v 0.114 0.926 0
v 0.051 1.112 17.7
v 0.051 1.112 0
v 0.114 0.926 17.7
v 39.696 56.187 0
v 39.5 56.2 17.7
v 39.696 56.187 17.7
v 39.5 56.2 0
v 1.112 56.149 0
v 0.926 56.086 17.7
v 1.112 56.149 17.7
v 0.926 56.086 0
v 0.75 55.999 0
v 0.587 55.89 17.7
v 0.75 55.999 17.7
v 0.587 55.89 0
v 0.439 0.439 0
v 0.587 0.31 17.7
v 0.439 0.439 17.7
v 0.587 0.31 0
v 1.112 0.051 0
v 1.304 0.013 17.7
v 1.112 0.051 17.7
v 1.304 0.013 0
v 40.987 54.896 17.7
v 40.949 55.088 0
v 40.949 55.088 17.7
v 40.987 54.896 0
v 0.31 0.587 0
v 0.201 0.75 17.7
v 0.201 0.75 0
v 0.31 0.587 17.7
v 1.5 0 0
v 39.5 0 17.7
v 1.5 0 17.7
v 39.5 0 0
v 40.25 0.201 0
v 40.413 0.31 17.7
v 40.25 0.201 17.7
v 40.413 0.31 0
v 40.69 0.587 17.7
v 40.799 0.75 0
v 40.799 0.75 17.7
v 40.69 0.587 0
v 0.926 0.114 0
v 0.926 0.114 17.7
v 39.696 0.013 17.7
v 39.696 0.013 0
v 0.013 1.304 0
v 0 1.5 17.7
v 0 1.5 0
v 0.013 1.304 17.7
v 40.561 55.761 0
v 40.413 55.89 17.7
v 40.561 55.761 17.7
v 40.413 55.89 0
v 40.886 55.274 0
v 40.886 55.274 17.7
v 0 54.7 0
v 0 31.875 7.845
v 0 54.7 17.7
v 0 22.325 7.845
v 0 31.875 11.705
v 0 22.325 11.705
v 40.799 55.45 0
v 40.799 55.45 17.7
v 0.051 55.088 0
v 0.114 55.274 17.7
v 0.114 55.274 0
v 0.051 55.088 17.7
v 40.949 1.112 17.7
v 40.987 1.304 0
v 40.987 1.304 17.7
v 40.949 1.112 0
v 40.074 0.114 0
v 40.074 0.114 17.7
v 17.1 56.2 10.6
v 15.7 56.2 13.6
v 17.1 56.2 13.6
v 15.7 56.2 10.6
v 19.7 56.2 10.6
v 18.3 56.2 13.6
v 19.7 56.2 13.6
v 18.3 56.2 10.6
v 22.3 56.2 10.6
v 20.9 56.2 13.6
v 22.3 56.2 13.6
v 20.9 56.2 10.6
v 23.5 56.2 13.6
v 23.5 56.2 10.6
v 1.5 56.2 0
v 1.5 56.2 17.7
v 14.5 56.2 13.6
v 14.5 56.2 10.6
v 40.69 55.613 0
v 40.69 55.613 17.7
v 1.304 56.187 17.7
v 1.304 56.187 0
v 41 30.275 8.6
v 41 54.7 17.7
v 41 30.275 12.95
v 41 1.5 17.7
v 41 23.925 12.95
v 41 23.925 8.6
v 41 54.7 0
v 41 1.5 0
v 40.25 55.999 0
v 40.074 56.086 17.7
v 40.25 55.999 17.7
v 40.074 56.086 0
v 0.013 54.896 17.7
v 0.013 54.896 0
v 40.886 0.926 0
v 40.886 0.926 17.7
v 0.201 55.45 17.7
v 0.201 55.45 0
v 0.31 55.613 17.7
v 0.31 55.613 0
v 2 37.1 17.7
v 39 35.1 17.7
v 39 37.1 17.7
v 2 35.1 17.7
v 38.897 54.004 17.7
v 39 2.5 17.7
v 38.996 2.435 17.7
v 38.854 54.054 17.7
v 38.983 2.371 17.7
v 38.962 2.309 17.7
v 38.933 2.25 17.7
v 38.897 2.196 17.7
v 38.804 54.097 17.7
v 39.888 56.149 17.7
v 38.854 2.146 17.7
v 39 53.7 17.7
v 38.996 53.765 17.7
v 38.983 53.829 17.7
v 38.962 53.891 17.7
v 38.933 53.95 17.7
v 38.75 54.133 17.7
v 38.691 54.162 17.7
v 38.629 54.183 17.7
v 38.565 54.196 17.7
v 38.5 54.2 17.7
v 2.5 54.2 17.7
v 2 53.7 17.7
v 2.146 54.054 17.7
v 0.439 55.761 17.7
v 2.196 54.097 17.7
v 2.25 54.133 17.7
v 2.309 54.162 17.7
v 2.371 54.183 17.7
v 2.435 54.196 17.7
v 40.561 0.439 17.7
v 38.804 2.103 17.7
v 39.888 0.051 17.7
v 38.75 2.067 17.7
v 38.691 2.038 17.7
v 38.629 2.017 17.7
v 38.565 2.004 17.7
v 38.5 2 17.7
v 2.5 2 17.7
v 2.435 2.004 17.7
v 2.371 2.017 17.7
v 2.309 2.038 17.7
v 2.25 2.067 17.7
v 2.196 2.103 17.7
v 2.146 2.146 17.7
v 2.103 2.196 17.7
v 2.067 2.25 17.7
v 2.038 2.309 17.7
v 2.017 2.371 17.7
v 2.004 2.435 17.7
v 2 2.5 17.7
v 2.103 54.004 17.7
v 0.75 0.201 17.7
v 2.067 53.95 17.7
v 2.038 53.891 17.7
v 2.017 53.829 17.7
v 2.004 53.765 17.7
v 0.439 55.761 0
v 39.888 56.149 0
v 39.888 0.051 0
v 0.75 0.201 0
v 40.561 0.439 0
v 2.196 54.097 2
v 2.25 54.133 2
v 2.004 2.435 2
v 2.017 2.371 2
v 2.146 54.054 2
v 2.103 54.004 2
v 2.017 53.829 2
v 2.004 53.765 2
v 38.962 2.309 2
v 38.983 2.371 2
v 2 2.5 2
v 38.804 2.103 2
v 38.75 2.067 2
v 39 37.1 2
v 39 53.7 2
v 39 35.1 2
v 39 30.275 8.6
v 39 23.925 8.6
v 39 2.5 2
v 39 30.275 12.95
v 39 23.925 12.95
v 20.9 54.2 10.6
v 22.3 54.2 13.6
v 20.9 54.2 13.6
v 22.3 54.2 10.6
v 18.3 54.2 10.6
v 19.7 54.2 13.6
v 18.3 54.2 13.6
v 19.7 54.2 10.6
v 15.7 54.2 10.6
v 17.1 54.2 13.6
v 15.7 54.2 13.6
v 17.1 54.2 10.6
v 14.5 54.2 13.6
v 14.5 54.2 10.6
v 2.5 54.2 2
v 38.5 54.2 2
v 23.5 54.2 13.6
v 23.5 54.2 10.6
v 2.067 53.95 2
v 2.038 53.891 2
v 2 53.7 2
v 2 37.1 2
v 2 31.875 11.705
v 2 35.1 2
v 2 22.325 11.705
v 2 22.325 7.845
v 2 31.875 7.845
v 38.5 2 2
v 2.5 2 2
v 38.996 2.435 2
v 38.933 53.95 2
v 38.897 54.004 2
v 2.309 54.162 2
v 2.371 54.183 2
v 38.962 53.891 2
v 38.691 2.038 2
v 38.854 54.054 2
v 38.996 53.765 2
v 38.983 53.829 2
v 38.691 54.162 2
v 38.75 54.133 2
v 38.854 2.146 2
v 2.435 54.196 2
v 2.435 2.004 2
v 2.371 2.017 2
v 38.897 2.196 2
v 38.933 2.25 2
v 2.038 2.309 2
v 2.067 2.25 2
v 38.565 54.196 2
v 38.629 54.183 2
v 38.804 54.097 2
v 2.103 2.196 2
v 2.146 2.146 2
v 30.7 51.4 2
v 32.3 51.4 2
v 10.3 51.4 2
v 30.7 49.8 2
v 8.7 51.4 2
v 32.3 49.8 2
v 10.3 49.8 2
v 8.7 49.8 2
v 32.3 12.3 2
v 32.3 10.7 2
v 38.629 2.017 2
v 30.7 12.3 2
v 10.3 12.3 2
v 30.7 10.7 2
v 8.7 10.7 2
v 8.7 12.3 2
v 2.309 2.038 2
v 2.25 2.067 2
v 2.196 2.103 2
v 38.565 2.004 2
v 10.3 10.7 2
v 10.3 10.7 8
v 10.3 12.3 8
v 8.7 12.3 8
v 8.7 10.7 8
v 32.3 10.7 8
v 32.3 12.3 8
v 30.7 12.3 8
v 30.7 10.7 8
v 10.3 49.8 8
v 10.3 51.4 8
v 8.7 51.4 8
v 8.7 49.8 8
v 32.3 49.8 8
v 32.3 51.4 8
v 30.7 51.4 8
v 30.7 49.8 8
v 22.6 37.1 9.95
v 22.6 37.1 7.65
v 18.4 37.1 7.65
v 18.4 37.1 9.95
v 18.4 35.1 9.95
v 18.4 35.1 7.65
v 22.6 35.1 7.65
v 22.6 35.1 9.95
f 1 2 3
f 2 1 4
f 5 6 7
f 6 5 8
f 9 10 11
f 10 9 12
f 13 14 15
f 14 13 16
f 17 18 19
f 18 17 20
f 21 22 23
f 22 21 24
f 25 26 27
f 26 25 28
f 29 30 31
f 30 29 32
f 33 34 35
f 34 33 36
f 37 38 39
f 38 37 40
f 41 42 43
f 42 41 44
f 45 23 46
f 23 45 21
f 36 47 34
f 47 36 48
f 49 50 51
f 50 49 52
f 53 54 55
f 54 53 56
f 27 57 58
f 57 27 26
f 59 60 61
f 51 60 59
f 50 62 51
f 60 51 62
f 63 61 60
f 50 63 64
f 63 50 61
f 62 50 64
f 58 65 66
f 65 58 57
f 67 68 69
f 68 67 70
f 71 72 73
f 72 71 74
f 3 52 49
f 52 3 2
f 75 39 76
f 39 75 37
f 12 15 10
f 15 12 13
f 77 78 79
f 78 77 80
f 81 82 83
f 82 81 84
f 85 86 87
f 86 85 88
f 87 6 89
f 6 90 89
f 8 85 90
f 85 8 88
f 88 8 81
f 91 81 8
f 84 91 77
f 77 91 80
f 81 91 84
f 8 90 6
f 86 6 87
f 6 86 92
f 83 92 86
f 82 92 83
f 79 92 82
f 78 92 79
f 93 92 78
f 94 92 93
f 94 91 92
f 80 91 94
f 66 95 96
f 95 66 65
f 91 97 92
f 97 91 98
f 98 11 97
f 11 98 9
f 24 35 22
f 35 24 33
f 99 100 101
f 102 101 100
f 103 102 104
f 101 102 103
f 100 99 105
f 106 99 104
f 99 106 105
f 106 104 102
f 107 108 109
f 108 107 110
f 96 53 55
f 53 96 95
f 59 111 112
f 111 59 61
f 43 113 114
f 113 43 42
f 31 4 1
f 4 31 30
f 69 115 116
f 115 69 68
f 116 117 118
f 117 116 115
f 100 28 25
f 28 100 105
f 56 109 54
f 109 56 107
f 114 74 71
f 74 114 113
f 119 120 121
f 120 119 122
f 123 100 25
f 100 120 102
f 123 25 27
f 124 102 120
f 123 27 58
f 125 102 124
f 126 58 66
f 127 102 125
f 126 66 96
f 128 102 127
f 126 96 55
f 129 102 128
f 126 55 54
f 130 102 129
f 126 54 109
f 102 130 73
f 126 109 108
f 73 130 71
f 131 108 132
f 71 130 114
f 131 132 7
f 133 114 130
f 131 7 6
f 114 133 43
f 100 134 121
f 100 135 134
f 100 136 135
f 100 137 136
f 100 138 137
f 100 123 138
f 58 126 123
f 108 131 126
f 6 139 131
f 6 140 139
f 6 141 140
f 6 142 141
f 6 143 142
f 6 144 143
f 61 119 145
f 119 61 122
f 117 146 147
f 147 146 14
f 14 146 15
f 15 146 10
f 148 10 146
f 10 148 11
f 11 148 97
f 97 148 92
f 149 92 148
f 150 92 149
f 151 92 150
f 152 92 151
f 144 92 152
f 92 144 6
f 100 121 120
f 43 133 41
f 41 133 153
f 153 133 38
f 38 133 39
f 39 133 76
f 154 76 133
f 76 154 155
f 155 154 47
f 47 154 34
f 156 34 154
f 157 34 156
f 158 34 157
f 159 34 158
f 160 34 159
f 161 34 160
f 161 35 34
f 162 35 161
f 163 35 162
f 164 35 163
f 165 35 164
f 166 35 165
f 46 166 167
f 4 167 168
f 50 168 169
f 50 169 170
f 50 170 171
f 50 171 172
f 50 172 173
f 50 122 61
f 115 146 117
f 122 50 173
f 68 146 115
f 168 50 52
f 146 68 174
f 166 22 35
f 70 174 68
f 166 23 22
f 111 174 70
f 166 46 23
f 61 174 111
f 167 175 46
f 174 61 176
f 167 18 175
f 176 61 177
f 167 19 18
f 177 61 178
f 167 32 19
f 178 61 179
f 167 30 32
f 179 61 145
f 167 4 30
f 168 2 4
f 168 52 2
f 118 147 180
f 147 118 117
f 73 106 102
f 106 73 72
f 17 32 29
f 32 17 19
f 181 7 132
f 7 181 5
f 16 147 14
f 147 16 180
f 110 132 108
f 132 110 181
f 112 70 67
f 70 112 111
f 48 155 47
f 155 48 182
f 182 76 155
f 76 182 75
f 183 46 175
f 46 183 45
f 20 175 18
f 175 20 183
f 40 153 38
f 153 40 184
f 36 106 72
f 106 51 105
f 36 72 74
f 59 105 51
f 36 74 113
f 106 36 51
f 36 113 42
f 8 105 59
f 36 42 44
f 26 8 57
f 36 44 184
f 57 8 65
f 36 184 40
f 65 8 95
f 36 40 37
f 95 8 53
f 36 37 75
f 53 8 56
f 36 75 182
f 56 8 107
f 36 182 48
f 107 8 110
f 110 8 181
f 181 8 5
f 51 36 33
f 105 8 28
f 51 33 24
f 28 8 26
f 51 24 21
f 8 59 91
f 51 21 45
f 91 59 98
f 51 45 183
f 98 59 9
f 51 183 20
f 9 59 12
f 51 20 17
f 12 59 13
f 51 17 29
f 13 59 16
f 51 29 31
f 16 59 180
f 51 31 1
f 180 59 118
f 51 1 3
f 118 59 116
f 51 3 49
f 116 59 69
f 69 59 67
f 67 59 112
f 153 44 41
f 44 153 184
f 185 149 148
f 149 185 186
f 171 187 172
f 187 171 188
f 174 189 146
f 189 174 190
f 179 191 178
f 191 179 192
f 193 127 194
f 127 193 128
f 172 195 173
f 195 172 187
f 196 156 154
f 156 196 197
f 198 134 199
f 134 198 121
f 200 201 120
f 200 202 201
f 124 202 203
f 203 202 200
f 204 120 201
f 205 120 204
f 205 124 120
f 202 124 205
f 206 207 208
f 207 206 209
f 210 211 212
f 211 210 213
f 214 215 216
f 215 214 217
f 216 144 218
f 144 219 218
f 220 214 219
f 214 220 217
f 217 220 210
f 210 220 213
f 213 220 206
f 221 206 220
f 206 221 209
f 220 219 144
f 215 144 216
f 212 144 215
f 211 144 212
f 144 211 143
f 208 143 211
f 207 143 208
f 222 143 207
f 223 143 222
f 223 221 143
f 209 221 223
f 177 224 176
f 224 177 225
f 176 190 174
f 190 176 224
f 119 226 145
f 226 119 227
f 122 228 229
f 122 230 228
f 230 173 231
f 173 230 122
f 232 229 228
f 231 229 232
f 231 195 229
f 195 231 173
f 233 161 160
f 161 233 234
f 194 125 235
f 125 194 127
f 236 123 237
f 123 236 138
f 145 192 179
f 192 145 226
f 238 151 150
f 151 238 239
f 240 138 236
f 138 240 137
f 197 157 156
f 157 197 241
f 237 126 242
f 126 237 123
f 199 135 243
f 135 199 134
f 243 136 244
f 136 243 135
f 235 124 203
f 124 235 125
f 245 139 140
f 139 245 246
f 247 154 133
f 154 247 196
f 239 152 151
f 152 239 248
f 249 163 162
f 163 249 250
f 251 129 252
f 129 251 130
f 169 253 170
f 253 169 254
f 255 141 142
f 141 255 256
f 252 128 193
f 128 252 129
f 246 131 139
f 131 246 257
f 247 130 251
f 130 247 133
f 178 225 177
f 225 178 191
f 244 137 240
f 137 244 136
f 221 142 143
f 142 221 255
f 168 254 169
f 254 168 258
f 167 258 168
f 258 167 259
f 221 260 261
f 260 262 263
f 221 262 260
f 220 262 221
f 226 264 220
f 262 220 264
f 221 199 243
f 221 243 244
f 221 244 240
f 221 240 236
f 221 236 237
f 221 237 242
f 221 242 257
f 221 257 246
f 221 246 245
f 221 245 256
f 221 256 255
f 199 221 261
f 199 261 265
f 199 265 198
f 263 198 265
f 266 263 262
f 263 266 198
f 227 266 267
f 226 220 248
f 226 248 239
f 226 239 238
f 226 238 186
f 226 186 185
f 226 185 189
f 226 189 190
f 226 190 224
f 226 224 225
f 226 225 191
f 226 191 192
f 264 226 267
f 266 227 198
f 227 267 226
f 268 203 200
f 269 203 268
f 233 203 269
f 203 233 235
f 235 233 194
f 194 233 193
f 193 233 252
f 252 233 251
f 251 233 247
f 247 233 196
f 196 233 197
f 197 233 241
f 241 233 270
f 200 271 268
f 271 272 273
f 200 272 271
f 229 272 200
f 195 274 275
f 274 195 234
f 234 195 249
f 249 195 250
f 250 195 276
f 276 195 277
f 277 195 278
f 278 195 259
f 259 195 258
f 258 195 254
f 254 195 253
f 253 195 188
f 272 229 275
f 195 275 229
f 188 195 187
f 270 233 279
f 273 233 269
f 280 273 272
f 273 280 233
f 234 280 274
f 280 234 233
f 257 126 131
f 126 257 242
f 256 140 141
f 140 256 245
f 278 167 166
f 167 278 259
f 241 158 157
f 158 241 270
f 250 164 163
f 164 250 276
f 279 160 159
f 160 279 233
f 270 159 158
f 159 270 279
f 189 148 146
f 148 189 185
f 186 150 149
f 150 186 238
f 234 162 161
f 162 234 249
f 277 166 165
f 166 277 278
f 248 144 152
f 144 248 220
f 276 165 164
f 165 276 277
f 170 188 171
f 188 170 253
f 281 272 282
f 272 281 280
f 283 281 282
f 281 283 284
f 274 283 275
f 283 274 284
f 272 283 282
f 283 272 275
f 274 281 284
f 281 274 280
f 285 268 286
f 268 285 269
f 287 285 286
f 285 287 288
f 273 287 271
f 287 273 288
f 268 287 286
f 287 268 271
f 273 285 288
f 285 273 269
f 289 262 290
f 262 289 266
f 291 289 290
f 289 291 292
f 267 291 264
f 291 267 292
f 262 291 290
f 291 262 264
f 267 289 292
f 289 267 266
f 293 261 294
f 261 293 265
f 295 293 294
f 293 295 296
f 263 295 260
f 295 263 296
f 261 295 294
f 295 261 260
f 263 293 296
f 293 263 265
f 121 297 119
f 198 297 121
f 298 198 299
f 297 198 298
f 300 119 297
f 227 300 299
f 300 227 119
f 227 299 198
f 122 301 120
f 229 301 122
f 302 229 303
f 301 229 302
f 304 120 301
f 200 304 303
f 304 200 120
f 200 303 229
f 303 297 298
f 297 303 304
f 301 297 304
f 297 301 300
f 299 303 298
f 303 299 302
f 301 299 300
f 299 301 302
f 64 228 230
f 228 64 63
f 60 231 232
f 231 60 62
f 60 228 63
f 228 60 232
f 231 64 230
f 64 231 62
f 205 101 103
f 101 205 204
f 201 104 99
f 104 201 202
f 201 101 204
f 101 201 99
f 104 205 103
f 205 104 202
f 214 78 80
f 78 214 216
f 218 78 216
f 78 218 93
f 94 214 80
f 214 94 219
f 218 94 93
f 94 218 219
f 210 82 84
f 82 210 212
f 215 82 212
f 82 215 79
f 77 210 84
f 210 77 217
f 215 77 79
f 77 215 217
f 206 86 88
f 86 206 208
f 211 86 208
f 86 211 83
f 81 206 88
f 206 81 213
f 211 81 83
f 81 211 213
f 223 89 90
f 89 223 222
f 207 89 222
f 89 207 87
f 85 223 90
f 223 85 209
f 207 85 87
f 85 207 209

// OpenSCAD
// file: env-sensor-case.scad
// SPDX-FileCopyrightText: 2026 Marcel Petrick <mail@marcelpetrick.it>
// SPDX-License-Identifier: GPL-3.0-or-later
// ENV sensor enclosure - common geometry for both variants.
//
// Do not edit the numbers here. Every dimension comes from params-<variant>.scad,
// which tools/boardgen/enclosure.py generates from the board model, so the case
// cannot drift away from the PCB it is meant to hold.
//
//   openscad -D 'part="base"' -o case-a-base.stl mechanical/case-a.scad
//   openscad -D 'part="lid"'  -o case-a-lid.stl  mechanical/case-a.scad
//
// The enclosure is part of the instrument: on Variant B the dividing wall at the
// neck and the vents over the island are what the thermal model's convection
// term actually depends on. See docs/45-thermal-model.md.

part = "base";      // "base" | "lid" | "both"
$fn = 48;

eps = 0.01;

// board position inside the cavity
bx = wall + (inner_w - board_w) / 2;
by = wall + (inner_h - board_h) / 2;
bz = floor_t + board_z;

module rrect(w, h, r) {
    hull() for (x = [r, w - r], y = [r, h - r]) translate([x, y]) circle(r);
}

module shell(height, r) {
    linear_extrude(height) rrect(outer_w, outer_h, r);
}

module cavity(height) {
    translate([wall, wall, 0])
        linear_extrude(height) rrect(inner_w, inner_h, max(0.5, fillet - wall));
}

// ---- cut-outs -------------------------------------------------------------
module wall_cutout(w, cx, cy, cw, ch, z) {
    // cx, cy are the board coordinates of the part the opening serves
    zz = bz + board_t + z;
    if (w == "left")
        translate([-eps, by + cy - cw / 2, zz - ch / 2])
            cube([wall + 2 * eps, cw, ch + tol]);
    else if (w == "right")
        translate([outer_w - wall - eps, by + cy - cw / 2, zz - ch / 2])
            cube([wall + 2 * eps, cw, ch + tol]);
    else if (w == "top")
        translate([bx + cx - cw / 2, -eps, zz - ch / 2])
            cube([cw, wall + 2 * eps, ch + tol]);
    else if (w == "bottom")
        translate([bx + cx - cw / 2, outer_h - wall - eps, zz - ch / 2])
            cube([cw, wall + 2 * eps, ch + tol]);
}

// The lid is the plate PLUS the locating lip, so anything cut in it has to go
// through both. Cutting only `lid_t` deep leaves the lip filling the slots
// straight back in - which is exactly what the first render showed.
lid_total = lid_t + 1.2;

module lid_cutout(centre_x, centre_y, d) {
    translate([bx + centre_x, by + centre_y, -eps])
        cylinder(d = d, h = lid_total + 2 * eps);
}

module vent_slots() {
    for (v = vents)
        translate([bx + v[0], by + v[1], -eps])
            cube([v[2], v[3], lid_total + 2 * eps]);
}

// Slots in the wall next to the sensor. Lid slots alone leave the sensor
// chamber a cup; M-03 wants ambient air at the sensor, not a pocket of it.
module side_vent_slots() {
    zz = bz + board_t + 1.0;
    for (s = side_vents) {
        if (vent_wall == "bottom")
            translate([bx + s[0] - s[1] / 2, outer_h - wall - eps, zz])
                cube([s[1], wall + 2 * eps, s[2]]);
        else
            translate([bx + s[0] - s[1] / 2, -eps, zz])
                cube([s[1], wall + 2 * eps, s[2]]);
    }
}

// Short pillars from the lid down onto bare board, so the PCB cannot rattle
// on its ribs. Positions come from the generator, which searched the placement
// for free space rather than assuming a corner was empty.
module holddown_pillars() {
    h = inner_z - (board_z + board_t);
    for (p = holddowns)
        translate([bx + p[0], by + p[1], lid_total - eps])
            cylinder(d = p[2], h = h + eps);
}

// ---- support --------------------------------------------------------------
module ribs() {
    // Four short ribs under the board corners, kept out of the antenna
    // keep-out so nothing dense sits behind the antenna (M-04).
    ay1 = antenna_keepout[3];
    for (p = [[3, ay1 + 3], [board_w - 3, ay1 + 3],
              [3, board_h - 3], [board_w - 3, board_h - 3]])
        translate([bx + p[0] - rib_w / 2, by + p[1] - rib_w / 2, floor_t])
            cube([rib_w, rib_w, board_z]);
}

module divider() {
    // Variant B only: the wall between the electronics chamber and the sensor
    // chamber, with a slot for the PCB neck to pass through.
    if (divider_y > 0) {
        difference() {
            translate([wall, by + divider_y - wall / 2, floor_t])
                cube([inner_w, wall, inner_z]);
            translate([bx + board_w / 2 - neck_slot[0] / 2,
                       by + divider_y - wall / 2 - eps,
                       bz - tol])
                cube([neck_slot[0], wall + 2 * eps, neck_slot[1]]);
        }
    }
}

// ---- parts ----------------------------------------------------------------
module base() {
    difference() {
        union() {
            difference() {
                shell(floor_t + inner_z, fillet);
                translate([0, 0, floor_t]) cavity(inner_z + eps);
            }
            ribs();
            divider();
        }
        for (c = cutouts)
            if (c[0] != "lid") wall_cutout(c[0], c[1], c[2], c[3], c[4], c[5]);
        side_vent_slots();
    }
}

module lid() {
    union() {
        difference() {
            union() {
                linear_extrude(lid_t) rrect(outer_w, outer_h, fillet);
                // lip that locates the lid in the cavity
                translate([wall + 0.3, wall + 0.3, lid_t])
                    linear_extrude(1.2)
                        rrect(inner_w - 0.6, inner_h - 0.6,
                              max(0.5, fillet - wall));
            }
            vent_slots();
            for (c = cutouts)
                if (c[0] == "lid") lid_cutout(c[1], c[2], c[3]);
        }
        holddown_pillars();
    }
}

if (part == "base") base();
else if (part == "lid") lid();
else { base(); translate([0, outer_h + 5, 0]) lid(); }
// file: params-b.scad
// SPDX-FileCopyrightText: 2026 Marcel Petrick <mail@marcelpetrick.it>
// SPDX-License-Identifier: GPL-3.0-or-later
// Generated by tools/boardgen/enclosure.py for variant B (Thermally isolated). Do not edit.
variant = "b";
board_w = 28.0; board_h = 51.0; board_t = 1.6;
wall = 2.0; floor_t = 2.0; lid_t = 2.0;
clear_xy = 0.6; fillet = 1.5; tol = 0.35;
rib_w = 1.6;
inner_w = 37.0; inner_h = 52.2; inner_z = 15.7;
board_z = 6.0; top_clear = 8.1;
outer_w = 41.0; outer_h = 56.2; outer_z = 19.7;
batt = [35.0, 30.0, 5.0];
// battery bay in BOARD coordinates; it may extend past the
// board edge, because the cavity is sized to the cell, not the PCB
batt_bay = [-3.5, 6.9, 31.5, 32.5];
divider_y = 33.5;
neck_slot = [4.2, 2.3];
antenna_keepout = [0.0, 0.0, 28.0, 5.9];
// [x, y, w, h] on the board, in board coordinates
vents = [[6.5, 43.5, 15.0, 1.2], [6.5, 46.1, 15.0, 1.2]];
vent_wall = "bottom";
// [centre, width, height] on the sensor-chamber wall
side_vents = [[8.6, 1.2, 3.0], [11.2, 1.2, 3.0], [13.799999999999999, 1.2, 3.0], [16.4, 1.2, 3.0]];
// [x, y, diameter] hold-down pillars, board coordinates
holddowns = [[1.6, 15.6, 2.2]];
// [wall, x, y, width, height, z] - x,y in board coordinates
cutouts = [["left", 5.5, 24.5, 9.549999999999999, 3.5100000000000002, 0.0], ["right", 22.85, 24.5, 6.35, 4.0, 1.0], ["lid", 13.7, 28.0, 4.0, 4.0, 0.0], ["lid", 11.3, 22.0, 2.0, 2.0, 0.0]];
board_outline = [[0, 0], [28.0, 0], [28.0, 34.0], [15.75, 34.0], [15.75, 42.0], [23.0, 42.0], [23.0, 51.0], [5.0, 51.0], [5.0, 42.0], [12.25, 42.0], [12.25, 34.0], [0, 34.0]];
// main file
// SPDX-FileCopyrightText: 2026 Marcel Petrick <mail@marcelpetrick.it>
// SPDX-License-Identifier: GPL-3.0-or-later
// Generated wrapper for variant B. Edit env-sensor-case.scad or the generator, not this file.
include <params-b.scad>
include <env-sensor-case.scad>
